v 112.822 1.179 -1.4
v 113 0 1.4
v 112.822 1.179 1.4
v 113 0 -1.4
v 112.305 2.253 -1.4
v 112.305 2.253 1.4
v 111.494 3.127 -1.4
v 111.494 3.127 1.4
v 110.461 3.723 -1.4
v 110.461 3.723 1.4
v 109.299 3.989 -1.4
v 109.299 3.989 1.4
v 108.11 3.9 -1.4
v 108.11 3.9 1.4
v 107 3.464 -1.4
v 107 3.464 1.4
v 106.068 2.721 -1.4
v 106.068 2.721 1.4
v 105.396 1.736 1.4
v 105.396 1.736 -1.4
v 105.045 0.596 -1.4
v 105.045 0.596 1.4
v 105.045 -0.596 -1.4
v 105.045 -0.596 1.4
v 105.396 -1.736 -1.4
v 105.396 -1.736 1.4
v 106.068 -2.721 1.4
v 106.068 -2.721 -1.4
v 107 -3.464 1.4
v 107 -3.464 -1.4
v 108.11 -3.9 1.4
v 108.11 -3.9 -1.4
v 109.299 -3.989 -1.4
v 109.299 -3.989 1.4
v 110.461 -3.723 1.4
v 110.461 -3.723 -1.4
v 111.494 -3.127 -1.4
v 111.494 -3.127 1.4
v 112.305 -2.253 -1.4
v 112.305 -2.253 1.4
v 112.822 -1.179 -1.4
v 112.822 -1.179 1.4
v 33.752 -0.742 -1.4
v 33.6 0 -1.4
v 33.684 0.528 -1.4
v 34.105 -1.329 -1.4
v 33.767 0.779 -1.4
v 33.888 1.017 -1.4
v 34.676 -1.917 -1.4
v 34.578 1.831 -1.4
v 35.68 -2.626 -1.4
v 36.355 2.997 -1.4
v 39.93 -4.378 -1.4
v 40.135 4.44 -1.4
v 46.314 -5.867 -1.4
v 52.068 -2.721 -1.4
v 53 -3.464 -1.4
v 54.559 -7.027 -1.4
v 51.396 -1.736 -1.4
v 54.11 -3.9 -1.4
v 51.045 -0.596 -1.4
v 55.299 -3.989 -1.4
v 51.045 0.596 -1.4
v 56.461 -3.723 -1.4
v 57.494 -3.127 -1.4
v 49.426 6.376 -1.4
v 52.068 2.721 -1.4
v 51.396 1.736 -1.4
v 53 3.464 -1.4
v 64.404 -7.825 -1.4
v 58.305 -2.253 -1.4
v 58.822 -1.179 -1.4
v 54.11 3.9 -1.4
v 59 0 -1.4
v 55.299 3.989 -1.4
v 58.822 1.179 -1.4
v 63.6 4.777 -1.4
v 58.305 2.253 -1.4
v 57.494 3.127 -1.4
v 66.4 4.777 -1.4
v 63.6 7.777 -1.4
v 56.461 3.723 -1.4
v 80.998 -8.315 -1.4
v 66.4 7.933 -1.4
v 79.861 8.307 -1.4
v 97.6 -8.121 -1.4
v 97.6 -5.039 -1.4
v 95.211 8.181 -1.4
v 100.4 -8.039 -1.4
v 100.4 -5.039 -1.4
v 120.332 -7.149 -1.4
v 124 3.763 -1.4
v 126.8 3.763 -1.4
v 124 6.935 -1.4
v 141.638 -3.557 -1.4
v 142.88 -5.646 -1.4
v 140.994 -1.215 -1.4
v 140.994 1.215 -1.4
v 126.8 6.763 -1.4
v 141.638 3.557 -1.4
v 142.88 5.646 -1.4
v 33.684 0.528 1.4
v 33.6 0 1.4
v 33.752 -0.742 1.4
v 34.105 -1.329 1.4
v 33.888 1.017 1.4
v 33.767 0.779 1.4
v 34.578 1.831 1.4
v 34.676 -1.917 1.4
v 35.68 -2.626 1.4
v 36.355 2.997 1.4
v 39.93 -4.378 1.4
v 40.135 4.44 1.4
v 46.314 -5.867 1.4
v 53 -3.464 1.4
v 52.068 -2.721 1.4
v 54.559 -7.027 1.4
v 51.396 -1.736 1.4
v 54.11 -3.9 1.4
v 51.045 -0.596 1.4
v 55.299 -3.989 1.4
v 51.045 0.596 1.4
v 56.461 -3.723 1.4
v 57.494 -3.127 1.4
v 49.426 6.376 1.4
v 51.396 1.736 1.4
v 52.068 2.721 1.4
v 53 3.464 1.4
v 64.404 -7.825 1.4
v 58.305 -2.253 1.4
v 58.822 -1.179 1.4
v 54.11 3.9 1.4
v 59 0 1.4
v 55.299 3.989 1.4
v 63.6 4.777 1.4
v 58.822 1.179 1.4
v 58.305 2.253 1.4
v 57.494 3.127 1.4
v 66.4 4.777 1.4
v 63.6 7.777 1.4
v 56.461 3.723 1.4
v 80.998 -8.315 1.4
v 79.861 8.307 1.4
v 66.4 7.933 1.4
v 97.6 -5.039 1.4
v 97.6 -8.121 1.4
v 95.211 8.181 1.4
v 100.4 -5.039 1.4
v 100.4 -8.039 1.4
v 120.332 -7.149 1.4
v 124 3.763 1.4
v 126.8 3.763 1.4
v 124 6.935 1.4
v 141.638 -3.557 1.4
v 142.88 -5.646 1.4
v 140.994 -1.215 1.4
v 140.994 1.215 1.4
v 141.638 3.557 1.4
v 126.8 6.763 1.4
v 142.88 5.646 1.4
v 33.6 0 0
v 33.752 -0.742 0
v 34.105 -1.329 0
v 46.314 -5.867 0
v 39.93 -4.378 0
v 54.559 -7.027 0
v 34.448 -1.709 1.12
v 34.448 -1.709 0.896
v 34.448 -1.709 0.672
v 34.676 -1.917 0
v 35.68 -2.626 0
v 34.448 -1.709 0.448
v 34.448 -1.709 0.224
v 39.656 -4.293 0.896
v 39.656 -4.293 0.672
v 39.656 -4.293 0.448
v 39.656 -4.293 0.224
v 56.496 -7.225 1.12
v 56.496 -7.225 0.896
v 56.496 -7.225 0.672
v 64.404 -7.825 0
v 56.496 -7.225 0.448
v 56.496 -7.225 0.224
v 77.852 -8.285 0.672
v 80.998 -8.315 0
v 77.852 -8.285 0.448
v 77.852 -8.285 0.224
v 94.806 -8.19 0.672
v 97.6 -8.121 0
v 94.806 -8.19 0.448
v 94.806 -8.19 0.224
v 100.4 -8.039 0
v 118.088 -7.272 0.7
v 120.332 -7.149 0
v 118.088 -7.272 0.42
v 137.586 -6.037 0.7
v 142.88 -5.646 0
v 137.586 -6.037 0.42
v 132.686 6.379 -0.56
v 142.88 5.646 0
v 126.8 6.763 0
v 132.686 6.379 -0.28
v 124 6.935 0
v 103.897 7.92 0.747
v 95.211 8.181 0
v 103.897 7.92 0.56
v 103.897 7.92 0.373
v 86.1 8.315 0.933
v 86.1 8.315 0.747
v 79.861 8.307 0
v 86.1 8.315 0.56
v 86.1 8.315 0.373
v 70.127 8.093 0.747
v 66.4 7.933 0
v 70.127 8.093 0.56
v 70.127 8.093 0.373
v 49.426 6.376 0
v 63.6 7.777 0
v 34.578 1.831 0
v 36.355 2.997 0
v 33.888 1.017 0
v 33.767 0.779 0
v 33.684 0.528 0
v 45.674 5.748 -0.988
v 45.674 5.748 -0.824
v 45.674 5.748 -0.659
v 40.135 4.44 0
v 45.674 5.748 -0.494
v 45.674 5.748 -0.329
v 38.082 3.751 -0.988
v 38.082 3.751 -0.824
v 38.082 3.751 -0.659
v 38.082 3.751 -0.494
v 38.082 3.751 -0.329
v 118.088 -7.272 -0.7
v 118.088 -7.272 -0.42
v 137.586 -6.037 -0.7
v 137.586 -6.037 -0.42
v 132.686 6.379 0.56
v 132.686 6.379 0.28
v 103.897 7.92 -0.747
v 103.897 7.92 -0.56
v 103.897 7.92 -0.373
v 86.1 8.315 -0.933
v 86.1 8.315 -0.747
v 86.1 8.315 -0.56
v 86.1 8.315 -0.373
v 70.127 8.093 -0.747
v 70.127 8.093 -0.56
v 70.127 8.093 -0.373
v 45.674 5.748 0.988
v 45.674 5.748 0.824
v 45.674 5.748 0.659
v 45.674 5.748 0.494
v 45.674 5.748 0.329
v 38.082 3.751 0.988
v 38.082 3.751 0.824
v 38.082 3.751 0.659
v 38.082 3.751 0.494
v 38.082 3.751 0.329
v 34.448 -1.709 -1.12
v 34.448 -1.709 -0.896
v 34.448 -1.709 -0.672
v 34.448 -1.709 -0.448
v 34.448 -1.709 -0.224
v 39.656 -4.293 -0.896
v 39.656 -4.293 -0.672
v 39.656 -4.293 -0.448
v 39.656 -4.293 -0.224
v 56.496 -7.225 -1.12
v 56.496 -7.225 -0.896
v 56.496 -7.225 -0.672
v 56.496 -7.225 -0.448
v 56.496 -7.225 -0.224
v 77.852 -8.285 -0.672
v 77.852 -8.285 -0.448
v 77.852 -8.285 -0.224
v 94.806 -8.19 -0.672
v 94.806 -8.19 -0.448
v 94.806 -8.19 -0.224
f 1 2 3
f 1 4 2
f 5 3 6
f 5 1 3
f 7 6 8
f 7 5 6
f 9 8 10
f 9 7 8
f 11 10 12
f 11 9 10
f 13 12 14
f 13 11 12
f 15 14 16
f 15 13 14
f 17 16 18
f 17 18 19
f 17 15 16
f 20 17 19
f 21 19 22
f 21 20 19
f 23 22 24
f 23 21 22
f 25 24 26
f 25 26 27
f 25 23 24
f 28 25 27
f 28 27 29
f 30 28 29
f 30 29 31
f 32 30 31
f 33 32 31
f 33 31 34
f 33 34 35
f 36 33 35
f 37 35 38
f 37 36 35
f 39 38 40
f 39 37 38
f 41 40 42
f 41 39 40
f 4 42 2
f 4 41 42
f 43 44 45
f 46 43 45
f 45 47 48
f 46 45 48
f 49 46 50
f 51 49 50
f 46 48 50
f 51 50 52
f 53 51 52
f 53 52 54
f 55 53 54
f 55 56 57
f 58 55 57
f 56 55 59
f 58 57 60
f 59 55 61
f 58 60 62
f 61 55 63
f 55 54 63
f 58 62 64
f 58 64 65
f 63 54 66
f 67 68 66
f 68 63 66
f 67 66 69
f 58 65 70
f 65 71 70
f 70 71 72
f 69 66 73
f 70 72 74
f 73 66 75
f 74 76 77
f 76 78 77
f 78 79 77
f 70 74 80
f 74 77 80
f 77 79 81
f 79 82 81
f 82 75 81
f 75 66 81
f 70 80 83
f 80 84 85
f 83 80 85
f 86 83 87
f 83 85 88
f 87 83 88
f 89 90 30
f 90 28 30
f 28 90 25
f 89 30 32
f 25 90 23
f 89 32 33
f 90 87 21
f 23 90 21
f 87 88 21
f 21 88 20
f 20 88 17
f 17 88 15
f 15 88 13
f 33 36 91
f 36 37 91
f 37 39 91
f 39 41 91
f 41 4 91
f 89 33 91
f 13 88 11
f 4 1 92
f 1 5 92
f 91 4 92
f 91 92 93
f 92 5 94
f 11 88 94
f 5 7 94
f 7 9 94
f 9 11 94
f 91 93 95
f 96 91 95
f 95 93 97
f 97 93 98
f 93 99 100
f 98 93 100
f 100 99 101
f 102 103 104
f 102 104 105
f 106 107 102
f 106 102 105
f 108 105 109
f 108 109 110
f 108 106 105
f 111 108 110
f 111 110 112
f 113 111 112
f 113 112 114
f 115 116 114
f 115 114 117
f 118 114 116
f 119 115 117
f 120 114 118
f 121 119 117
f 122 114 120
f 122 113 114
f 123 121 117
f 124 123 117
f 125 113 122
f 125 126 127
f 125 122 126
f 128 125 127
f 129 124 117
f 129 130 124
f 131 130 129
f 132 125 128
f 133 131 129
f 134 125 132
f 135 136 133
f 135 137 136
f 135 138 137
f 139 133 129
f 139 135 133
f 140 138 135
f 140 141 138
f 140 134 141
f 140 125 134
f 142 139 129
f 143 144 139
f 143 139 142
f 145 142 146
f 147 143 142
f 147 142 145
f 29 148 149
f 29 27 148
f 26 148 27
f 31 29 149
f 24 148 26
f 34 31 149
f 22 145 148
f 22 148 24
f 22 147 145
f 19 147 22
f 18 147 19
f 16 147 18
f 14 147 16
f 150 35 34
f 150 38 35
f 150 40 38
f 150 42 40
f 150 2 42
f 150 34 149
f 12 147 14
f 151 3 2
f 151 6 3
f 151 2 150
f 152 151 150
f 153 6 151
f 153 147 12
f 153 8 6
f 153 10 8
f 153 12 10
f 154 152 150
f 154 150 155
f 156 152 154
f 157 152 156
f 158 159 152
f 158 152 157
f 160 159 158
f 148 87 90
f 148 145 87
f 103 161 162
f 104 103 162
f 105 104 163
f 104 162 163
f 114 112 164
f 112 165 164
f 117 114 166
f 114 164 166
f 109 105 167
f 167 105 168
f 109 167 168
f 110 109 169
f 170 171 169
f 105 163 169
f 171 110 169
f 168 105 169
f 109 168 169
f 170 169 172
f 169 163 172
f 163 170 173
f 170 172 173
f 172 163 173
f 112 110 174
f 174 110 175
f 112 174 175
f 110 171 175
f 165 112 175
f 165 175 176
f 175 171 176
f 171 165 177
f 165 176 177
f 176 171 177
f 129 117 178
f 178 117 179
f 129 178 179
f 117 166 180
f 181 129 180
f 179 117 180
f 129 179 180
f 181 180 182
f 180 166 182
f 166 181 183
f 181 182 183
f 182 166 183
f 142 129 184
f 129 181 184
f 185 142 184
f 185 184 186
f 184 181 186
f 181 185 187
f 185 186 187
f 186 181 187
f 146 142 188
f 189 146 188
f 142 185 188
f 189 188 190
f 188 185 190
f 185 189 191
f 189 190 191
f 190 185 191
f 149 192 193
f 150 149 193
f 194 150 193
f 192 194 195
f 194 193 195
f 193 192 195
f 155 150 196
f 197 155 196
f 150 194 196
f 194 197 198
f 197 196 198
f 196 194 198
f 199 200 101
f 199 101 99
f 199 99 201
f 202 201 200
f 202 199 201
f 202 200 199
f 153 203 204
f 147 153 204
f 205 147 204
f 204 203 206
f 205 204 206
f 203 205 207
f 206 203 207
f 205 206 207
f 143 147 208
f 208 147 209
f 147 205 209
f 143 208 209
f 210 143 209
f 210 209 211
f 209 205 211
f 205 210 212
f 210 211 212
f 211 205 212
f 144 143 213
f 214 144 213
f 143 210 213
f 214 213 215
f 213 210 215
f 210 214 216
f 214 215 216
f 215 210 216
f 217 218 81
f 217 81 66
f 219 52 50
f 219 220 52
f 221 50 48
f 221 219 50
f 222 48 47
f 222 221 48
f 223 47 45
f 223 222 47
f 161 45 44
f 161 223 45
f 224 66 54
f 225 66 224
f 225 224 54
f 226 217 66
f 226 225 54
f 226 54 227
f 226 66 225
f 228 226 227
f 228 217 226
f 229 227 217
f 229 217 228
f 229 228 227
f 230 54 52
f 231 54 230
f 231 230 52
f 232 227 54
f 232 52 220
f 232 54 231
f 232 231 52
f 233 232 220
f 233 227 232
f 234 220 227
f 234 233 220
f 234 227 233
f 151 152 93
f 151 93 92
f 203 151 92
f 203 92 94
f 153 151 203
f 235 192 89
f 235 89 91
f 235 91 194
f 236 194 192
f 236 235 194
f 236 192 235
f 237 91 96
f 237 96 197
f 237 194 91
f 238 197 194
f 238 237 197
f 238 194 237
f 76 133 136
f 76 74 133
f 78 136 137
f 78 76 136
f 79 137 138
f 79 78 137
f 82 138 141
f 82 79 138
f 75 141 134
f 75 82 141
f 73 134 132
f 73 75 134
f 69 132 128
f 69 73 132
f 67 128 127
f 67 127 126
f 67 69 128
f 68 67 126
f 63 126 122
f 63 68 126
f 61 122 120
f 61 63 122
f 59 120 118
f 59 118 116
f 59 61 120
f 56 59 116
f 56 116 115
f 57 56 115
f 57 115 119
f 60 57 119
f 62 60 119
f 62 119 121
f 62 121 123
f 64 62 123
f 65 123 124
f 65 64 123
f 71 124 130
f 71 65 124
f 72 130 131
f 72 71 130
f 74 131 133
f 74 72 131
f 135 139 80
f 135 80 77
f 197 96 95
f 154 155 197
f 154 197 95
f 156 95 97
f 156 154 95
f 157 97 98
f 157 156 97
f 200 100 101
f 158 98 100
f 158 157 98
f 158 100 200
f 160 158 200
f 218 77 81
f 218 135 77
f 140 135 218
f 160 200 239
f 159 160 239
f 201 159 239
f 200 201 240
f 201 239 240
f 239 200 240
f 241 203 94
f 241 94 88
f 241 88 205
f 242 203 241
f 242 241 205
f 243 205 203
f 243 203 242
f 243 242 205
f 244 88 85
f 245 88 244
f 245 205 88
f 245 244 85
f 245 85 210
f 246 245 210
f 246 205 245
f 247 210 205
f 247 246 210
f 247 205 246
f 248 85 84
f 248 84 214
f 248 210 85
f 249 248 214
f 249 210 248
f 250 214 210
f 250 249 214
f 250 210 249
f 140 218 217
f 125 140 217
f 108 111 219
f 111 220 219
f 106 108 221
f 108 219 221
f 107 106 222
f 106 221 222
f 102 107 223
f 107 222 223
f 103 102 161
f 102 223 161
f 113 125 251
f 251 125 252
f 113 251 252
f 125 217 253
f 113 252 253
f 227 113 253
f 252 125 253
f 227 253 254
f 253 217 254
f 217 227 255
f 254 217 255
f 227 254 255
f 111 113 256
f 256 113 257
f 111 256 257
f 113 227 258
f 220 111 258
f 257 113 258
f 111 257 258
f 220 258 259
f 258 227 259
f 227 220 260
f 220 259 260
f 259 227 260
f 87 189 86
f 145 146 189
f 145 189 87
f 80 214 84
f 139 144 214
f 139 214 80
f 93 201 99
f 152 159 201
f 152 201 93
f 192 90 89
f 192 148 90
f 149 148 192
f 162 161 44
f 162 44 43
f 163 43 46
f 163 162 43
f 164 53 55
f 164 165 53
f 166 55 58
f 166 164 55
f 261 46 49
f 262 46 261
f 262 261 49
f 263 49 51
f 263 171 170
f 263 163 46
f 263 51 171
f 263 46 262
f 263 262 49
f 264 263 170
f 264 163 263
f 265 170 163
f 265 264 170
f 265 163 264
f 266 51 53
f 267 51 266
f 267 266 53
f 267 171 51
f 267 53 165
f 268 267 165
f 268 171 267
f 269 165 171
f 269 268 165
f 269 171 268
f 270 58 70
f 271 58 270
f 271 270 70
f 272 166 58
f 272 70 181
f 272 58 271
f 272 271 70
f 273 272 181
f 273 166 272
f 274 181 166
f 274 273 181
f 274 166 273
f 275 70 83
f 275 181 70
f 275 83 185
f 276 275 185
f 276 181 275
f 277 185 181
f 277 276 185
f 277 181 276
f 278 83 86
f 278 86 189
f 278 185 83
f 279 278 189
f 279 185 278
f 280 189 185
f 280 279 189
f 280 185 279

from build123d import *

# Parameters (mm, degrees)
SKETCH_1_R      = 4
EXTRUDE_1_DEPTH = 1.4


with BuildPart() as part:
    # Эскиз1 → Бобышка-Вытянуть1 (new, symmetric)
    with BuildSketch(Plane.XY):
        with BuildLine():
            ThreePointArc((142.879654521, -5.645889143), (140.91290042, 0), (142.879654521, 5.645889143))
            add(Edge.make_bspline(
                [(142.879654521, 5.645889143), (142.747268556, 5.655935735), (140.983089587, 5.789556497), (137.585492165, 6.040187447), (132.68922042, 6.382393711), (129.093359344, 6.61888416), (127.131231234, 6.742693318), (126.8, 6.763442063)],
                knots=[0.339950039, 0.339950039, 0.339950039, 0.339950039, 0.342309554, 0.371392651, 0.400495753, 0.429537687, 0.435435831, 0.435435831, 0.435435831, 0.435435831], degree=3))
            Line((126.8, 6.763442063), (126.8, 3.763442063))
            Line((126.8, 3.763442063), (124, 3.763442063))
            Line((124, 3.763442063), (124, 6.935165252))
            add(Edge.make_bspline(
                [(124, 6.935165252), (123.641212233, 6.956691636), (121.670677761, 7.073894152), (118.103435227, 7.275698401), (113.316671904, 7.521871639), (108.586398202, 7.738792494), (103.923211277, 7.924514665), (99.337253306, 8.077210344), (94.83828356, 8.195186848), (90.435677893, 8.276886408), (86.138497273, 8.320981466), (81.955490955, 8.326384834), (77.89513162, 8.292131727), (73.965623193, 8.217718888), (70.174939177, 8.10268745), (67.668791632, 7.99564794), (66.426868705, 7.933879191), (66.4, 7.93253874)],
                knots=[0.452054102, 0.452054102, 0.452054102, 0.452054102, 0.458441906, 0.487136114, 0.515551917, 0.543623847, 0.571289985, 0.59849081, 0.625169613, 0.651272029, 0.676746158, 0.701541791, 0.725611017, 0.748907835, 0.771387785, 0.793008139, 0.793486237, 0.793486237, 0.793486237, 0.793486237], degree=3))
            Line((66.4, 7.93253874), (66.4, 4.777447755))
            Line((66.4, 4.777447755), (63.6, 4.777447755))
            Line((63.6, 4.777447755), (63.6, 7.777447755))
            add(Edge.make_bspline(
                [(63.6, 7.777447755), (63.396162512, 7.764994786), (62.081509824, 7.682983398), (59.712211754, 7.515019975), (56.552200858, 7.239849215), (53.56772758, 6.926570619), (50.765590148, 6.57637304), (48.152410031, 6.190731972), (45.734630901, 5.771261543), (43.518525859, 5.319707647), (41.510178464, 4.837901503), (39.715362287, 4.3277629), (38.139724526, 3.791042715), (36.787821083, 3.229441513), (35.665157045, 2.644102252), (34.771002159, 2.034538769), (34.118995376, 1.396849457), (33.68372682, 0.718681816), (33.626994167, 0.231708516), (33.6, 0)],
                knots=[0.810098727, 0.810098727, 0.810098727, 0.810098727, 0.813728033, 0.833507815, 0.852309696, 0.87009731, 0.886835918, 0.902492782, 0.917037139, 0.930441054, 0.942679762, 0.953733567, 0.963589785, 0.972247019, 0.979722225, 0.986065145, 0.991385258, 0.995900989, 1, 1, 1, 1], degree=3))
            add(Edge.make_bspline(
                [(33.6, 0), (33.626994167, -0.231708516), (33.68372682, -0.718681816), (34.118995376, -1.396849457), (34.771002159, -2.034538769), (35.665157045, -2.644102252), (36.787821083, -3.229441513), (38.139724526, -3.791042715), (39.715362287, -4.3277629), (41.510178464, -4.837901503), (43.518525859, -5.319707647), (45.734630901, -5.771261543), (48.152410031, -6.190731972), (50.765590148, -6.57637304), (53.56772758, -6.926570619), (56.552200858, -7.239849215), (59.712211754, -7.515019975), (63.040803104, -7.750989271), (66.530820659, -7.947044314), (70.174939177, -8.10268745), (73.965623193, -8.217718888), (77.89513162, -8.292131727), (81.955490955, -8.326384834), (86.138497273, -8.320981466), (90.435677893, -8.276886408), (94.268903337, -8.20575289), (96.668631576, -8.146352686), (97.6, -8.121192528)],
                knots=[0, 0, 0, 0, 0.004099011, 0.008614742, 0.013934855, 0.020277775, 0.027752981, 0.036410215, 0.046266433, 0.057320238, 0.069558946, 0.082962861, 0.097507218, 0.113164082, 0.12990269, 0.147690304, 0.166492185, 0.186271967, 0.206991861, 0.228612215, 0.251092165, 0.274388983, 0.298458209, 0.323253842, 0.348727971, 0.374830387, 0.391388582, 0.391388582, 0.391388582, 0.391388582], degree=3))
            Line((97.6, -8.121192528), (97.6, -5.039340517))
            Line((97.6, -5.039340517), (100.4, -5.039340517))
            Line((100.4, -5.039340517), (100.4, -8.039340517))
            add(Edge.make_bspline(
                [(100.400000001, -8.039340517), (101.56572059, -8.002730044), (104.287183669, -7.910018625), (108.586398202, -7.738792494), (113.316671904, -7.521871639), (118.103435227, -7.275698401), (122.935626987, -7.002334081), (127.801626972, -6.703838046), (132.68922042, -6.382393711), (137.585492165, -6.040187447), (140.983089587, -5.789556497), (142.747268556, -5.655935735), (142.879654521, -5.645889143)],
                knots=[0.40798276, 0.40798276, 0.40798276, 0.40798276, 0.428710015, 0.456376153, 0.484448083, 0.512863886, 0.541558094, 0.570462313, 0.599504247, 0.628607349, 0.657690446, 0.660049961, 0.660049961, 0.660049961, 0.660049961], degree=3))
        make_face()
        with Locations((55, 0)):
            Circle(SKETCH_1_R, mode=Mode.SUBTRACT)
        with Locations((109, 0)):
            Circle(SKETCH_1_R, mode=Mode.SUBTRACT)
    extrude(amount=EXTRUDE_1_DEPTH, both=True)


solid = part.part
